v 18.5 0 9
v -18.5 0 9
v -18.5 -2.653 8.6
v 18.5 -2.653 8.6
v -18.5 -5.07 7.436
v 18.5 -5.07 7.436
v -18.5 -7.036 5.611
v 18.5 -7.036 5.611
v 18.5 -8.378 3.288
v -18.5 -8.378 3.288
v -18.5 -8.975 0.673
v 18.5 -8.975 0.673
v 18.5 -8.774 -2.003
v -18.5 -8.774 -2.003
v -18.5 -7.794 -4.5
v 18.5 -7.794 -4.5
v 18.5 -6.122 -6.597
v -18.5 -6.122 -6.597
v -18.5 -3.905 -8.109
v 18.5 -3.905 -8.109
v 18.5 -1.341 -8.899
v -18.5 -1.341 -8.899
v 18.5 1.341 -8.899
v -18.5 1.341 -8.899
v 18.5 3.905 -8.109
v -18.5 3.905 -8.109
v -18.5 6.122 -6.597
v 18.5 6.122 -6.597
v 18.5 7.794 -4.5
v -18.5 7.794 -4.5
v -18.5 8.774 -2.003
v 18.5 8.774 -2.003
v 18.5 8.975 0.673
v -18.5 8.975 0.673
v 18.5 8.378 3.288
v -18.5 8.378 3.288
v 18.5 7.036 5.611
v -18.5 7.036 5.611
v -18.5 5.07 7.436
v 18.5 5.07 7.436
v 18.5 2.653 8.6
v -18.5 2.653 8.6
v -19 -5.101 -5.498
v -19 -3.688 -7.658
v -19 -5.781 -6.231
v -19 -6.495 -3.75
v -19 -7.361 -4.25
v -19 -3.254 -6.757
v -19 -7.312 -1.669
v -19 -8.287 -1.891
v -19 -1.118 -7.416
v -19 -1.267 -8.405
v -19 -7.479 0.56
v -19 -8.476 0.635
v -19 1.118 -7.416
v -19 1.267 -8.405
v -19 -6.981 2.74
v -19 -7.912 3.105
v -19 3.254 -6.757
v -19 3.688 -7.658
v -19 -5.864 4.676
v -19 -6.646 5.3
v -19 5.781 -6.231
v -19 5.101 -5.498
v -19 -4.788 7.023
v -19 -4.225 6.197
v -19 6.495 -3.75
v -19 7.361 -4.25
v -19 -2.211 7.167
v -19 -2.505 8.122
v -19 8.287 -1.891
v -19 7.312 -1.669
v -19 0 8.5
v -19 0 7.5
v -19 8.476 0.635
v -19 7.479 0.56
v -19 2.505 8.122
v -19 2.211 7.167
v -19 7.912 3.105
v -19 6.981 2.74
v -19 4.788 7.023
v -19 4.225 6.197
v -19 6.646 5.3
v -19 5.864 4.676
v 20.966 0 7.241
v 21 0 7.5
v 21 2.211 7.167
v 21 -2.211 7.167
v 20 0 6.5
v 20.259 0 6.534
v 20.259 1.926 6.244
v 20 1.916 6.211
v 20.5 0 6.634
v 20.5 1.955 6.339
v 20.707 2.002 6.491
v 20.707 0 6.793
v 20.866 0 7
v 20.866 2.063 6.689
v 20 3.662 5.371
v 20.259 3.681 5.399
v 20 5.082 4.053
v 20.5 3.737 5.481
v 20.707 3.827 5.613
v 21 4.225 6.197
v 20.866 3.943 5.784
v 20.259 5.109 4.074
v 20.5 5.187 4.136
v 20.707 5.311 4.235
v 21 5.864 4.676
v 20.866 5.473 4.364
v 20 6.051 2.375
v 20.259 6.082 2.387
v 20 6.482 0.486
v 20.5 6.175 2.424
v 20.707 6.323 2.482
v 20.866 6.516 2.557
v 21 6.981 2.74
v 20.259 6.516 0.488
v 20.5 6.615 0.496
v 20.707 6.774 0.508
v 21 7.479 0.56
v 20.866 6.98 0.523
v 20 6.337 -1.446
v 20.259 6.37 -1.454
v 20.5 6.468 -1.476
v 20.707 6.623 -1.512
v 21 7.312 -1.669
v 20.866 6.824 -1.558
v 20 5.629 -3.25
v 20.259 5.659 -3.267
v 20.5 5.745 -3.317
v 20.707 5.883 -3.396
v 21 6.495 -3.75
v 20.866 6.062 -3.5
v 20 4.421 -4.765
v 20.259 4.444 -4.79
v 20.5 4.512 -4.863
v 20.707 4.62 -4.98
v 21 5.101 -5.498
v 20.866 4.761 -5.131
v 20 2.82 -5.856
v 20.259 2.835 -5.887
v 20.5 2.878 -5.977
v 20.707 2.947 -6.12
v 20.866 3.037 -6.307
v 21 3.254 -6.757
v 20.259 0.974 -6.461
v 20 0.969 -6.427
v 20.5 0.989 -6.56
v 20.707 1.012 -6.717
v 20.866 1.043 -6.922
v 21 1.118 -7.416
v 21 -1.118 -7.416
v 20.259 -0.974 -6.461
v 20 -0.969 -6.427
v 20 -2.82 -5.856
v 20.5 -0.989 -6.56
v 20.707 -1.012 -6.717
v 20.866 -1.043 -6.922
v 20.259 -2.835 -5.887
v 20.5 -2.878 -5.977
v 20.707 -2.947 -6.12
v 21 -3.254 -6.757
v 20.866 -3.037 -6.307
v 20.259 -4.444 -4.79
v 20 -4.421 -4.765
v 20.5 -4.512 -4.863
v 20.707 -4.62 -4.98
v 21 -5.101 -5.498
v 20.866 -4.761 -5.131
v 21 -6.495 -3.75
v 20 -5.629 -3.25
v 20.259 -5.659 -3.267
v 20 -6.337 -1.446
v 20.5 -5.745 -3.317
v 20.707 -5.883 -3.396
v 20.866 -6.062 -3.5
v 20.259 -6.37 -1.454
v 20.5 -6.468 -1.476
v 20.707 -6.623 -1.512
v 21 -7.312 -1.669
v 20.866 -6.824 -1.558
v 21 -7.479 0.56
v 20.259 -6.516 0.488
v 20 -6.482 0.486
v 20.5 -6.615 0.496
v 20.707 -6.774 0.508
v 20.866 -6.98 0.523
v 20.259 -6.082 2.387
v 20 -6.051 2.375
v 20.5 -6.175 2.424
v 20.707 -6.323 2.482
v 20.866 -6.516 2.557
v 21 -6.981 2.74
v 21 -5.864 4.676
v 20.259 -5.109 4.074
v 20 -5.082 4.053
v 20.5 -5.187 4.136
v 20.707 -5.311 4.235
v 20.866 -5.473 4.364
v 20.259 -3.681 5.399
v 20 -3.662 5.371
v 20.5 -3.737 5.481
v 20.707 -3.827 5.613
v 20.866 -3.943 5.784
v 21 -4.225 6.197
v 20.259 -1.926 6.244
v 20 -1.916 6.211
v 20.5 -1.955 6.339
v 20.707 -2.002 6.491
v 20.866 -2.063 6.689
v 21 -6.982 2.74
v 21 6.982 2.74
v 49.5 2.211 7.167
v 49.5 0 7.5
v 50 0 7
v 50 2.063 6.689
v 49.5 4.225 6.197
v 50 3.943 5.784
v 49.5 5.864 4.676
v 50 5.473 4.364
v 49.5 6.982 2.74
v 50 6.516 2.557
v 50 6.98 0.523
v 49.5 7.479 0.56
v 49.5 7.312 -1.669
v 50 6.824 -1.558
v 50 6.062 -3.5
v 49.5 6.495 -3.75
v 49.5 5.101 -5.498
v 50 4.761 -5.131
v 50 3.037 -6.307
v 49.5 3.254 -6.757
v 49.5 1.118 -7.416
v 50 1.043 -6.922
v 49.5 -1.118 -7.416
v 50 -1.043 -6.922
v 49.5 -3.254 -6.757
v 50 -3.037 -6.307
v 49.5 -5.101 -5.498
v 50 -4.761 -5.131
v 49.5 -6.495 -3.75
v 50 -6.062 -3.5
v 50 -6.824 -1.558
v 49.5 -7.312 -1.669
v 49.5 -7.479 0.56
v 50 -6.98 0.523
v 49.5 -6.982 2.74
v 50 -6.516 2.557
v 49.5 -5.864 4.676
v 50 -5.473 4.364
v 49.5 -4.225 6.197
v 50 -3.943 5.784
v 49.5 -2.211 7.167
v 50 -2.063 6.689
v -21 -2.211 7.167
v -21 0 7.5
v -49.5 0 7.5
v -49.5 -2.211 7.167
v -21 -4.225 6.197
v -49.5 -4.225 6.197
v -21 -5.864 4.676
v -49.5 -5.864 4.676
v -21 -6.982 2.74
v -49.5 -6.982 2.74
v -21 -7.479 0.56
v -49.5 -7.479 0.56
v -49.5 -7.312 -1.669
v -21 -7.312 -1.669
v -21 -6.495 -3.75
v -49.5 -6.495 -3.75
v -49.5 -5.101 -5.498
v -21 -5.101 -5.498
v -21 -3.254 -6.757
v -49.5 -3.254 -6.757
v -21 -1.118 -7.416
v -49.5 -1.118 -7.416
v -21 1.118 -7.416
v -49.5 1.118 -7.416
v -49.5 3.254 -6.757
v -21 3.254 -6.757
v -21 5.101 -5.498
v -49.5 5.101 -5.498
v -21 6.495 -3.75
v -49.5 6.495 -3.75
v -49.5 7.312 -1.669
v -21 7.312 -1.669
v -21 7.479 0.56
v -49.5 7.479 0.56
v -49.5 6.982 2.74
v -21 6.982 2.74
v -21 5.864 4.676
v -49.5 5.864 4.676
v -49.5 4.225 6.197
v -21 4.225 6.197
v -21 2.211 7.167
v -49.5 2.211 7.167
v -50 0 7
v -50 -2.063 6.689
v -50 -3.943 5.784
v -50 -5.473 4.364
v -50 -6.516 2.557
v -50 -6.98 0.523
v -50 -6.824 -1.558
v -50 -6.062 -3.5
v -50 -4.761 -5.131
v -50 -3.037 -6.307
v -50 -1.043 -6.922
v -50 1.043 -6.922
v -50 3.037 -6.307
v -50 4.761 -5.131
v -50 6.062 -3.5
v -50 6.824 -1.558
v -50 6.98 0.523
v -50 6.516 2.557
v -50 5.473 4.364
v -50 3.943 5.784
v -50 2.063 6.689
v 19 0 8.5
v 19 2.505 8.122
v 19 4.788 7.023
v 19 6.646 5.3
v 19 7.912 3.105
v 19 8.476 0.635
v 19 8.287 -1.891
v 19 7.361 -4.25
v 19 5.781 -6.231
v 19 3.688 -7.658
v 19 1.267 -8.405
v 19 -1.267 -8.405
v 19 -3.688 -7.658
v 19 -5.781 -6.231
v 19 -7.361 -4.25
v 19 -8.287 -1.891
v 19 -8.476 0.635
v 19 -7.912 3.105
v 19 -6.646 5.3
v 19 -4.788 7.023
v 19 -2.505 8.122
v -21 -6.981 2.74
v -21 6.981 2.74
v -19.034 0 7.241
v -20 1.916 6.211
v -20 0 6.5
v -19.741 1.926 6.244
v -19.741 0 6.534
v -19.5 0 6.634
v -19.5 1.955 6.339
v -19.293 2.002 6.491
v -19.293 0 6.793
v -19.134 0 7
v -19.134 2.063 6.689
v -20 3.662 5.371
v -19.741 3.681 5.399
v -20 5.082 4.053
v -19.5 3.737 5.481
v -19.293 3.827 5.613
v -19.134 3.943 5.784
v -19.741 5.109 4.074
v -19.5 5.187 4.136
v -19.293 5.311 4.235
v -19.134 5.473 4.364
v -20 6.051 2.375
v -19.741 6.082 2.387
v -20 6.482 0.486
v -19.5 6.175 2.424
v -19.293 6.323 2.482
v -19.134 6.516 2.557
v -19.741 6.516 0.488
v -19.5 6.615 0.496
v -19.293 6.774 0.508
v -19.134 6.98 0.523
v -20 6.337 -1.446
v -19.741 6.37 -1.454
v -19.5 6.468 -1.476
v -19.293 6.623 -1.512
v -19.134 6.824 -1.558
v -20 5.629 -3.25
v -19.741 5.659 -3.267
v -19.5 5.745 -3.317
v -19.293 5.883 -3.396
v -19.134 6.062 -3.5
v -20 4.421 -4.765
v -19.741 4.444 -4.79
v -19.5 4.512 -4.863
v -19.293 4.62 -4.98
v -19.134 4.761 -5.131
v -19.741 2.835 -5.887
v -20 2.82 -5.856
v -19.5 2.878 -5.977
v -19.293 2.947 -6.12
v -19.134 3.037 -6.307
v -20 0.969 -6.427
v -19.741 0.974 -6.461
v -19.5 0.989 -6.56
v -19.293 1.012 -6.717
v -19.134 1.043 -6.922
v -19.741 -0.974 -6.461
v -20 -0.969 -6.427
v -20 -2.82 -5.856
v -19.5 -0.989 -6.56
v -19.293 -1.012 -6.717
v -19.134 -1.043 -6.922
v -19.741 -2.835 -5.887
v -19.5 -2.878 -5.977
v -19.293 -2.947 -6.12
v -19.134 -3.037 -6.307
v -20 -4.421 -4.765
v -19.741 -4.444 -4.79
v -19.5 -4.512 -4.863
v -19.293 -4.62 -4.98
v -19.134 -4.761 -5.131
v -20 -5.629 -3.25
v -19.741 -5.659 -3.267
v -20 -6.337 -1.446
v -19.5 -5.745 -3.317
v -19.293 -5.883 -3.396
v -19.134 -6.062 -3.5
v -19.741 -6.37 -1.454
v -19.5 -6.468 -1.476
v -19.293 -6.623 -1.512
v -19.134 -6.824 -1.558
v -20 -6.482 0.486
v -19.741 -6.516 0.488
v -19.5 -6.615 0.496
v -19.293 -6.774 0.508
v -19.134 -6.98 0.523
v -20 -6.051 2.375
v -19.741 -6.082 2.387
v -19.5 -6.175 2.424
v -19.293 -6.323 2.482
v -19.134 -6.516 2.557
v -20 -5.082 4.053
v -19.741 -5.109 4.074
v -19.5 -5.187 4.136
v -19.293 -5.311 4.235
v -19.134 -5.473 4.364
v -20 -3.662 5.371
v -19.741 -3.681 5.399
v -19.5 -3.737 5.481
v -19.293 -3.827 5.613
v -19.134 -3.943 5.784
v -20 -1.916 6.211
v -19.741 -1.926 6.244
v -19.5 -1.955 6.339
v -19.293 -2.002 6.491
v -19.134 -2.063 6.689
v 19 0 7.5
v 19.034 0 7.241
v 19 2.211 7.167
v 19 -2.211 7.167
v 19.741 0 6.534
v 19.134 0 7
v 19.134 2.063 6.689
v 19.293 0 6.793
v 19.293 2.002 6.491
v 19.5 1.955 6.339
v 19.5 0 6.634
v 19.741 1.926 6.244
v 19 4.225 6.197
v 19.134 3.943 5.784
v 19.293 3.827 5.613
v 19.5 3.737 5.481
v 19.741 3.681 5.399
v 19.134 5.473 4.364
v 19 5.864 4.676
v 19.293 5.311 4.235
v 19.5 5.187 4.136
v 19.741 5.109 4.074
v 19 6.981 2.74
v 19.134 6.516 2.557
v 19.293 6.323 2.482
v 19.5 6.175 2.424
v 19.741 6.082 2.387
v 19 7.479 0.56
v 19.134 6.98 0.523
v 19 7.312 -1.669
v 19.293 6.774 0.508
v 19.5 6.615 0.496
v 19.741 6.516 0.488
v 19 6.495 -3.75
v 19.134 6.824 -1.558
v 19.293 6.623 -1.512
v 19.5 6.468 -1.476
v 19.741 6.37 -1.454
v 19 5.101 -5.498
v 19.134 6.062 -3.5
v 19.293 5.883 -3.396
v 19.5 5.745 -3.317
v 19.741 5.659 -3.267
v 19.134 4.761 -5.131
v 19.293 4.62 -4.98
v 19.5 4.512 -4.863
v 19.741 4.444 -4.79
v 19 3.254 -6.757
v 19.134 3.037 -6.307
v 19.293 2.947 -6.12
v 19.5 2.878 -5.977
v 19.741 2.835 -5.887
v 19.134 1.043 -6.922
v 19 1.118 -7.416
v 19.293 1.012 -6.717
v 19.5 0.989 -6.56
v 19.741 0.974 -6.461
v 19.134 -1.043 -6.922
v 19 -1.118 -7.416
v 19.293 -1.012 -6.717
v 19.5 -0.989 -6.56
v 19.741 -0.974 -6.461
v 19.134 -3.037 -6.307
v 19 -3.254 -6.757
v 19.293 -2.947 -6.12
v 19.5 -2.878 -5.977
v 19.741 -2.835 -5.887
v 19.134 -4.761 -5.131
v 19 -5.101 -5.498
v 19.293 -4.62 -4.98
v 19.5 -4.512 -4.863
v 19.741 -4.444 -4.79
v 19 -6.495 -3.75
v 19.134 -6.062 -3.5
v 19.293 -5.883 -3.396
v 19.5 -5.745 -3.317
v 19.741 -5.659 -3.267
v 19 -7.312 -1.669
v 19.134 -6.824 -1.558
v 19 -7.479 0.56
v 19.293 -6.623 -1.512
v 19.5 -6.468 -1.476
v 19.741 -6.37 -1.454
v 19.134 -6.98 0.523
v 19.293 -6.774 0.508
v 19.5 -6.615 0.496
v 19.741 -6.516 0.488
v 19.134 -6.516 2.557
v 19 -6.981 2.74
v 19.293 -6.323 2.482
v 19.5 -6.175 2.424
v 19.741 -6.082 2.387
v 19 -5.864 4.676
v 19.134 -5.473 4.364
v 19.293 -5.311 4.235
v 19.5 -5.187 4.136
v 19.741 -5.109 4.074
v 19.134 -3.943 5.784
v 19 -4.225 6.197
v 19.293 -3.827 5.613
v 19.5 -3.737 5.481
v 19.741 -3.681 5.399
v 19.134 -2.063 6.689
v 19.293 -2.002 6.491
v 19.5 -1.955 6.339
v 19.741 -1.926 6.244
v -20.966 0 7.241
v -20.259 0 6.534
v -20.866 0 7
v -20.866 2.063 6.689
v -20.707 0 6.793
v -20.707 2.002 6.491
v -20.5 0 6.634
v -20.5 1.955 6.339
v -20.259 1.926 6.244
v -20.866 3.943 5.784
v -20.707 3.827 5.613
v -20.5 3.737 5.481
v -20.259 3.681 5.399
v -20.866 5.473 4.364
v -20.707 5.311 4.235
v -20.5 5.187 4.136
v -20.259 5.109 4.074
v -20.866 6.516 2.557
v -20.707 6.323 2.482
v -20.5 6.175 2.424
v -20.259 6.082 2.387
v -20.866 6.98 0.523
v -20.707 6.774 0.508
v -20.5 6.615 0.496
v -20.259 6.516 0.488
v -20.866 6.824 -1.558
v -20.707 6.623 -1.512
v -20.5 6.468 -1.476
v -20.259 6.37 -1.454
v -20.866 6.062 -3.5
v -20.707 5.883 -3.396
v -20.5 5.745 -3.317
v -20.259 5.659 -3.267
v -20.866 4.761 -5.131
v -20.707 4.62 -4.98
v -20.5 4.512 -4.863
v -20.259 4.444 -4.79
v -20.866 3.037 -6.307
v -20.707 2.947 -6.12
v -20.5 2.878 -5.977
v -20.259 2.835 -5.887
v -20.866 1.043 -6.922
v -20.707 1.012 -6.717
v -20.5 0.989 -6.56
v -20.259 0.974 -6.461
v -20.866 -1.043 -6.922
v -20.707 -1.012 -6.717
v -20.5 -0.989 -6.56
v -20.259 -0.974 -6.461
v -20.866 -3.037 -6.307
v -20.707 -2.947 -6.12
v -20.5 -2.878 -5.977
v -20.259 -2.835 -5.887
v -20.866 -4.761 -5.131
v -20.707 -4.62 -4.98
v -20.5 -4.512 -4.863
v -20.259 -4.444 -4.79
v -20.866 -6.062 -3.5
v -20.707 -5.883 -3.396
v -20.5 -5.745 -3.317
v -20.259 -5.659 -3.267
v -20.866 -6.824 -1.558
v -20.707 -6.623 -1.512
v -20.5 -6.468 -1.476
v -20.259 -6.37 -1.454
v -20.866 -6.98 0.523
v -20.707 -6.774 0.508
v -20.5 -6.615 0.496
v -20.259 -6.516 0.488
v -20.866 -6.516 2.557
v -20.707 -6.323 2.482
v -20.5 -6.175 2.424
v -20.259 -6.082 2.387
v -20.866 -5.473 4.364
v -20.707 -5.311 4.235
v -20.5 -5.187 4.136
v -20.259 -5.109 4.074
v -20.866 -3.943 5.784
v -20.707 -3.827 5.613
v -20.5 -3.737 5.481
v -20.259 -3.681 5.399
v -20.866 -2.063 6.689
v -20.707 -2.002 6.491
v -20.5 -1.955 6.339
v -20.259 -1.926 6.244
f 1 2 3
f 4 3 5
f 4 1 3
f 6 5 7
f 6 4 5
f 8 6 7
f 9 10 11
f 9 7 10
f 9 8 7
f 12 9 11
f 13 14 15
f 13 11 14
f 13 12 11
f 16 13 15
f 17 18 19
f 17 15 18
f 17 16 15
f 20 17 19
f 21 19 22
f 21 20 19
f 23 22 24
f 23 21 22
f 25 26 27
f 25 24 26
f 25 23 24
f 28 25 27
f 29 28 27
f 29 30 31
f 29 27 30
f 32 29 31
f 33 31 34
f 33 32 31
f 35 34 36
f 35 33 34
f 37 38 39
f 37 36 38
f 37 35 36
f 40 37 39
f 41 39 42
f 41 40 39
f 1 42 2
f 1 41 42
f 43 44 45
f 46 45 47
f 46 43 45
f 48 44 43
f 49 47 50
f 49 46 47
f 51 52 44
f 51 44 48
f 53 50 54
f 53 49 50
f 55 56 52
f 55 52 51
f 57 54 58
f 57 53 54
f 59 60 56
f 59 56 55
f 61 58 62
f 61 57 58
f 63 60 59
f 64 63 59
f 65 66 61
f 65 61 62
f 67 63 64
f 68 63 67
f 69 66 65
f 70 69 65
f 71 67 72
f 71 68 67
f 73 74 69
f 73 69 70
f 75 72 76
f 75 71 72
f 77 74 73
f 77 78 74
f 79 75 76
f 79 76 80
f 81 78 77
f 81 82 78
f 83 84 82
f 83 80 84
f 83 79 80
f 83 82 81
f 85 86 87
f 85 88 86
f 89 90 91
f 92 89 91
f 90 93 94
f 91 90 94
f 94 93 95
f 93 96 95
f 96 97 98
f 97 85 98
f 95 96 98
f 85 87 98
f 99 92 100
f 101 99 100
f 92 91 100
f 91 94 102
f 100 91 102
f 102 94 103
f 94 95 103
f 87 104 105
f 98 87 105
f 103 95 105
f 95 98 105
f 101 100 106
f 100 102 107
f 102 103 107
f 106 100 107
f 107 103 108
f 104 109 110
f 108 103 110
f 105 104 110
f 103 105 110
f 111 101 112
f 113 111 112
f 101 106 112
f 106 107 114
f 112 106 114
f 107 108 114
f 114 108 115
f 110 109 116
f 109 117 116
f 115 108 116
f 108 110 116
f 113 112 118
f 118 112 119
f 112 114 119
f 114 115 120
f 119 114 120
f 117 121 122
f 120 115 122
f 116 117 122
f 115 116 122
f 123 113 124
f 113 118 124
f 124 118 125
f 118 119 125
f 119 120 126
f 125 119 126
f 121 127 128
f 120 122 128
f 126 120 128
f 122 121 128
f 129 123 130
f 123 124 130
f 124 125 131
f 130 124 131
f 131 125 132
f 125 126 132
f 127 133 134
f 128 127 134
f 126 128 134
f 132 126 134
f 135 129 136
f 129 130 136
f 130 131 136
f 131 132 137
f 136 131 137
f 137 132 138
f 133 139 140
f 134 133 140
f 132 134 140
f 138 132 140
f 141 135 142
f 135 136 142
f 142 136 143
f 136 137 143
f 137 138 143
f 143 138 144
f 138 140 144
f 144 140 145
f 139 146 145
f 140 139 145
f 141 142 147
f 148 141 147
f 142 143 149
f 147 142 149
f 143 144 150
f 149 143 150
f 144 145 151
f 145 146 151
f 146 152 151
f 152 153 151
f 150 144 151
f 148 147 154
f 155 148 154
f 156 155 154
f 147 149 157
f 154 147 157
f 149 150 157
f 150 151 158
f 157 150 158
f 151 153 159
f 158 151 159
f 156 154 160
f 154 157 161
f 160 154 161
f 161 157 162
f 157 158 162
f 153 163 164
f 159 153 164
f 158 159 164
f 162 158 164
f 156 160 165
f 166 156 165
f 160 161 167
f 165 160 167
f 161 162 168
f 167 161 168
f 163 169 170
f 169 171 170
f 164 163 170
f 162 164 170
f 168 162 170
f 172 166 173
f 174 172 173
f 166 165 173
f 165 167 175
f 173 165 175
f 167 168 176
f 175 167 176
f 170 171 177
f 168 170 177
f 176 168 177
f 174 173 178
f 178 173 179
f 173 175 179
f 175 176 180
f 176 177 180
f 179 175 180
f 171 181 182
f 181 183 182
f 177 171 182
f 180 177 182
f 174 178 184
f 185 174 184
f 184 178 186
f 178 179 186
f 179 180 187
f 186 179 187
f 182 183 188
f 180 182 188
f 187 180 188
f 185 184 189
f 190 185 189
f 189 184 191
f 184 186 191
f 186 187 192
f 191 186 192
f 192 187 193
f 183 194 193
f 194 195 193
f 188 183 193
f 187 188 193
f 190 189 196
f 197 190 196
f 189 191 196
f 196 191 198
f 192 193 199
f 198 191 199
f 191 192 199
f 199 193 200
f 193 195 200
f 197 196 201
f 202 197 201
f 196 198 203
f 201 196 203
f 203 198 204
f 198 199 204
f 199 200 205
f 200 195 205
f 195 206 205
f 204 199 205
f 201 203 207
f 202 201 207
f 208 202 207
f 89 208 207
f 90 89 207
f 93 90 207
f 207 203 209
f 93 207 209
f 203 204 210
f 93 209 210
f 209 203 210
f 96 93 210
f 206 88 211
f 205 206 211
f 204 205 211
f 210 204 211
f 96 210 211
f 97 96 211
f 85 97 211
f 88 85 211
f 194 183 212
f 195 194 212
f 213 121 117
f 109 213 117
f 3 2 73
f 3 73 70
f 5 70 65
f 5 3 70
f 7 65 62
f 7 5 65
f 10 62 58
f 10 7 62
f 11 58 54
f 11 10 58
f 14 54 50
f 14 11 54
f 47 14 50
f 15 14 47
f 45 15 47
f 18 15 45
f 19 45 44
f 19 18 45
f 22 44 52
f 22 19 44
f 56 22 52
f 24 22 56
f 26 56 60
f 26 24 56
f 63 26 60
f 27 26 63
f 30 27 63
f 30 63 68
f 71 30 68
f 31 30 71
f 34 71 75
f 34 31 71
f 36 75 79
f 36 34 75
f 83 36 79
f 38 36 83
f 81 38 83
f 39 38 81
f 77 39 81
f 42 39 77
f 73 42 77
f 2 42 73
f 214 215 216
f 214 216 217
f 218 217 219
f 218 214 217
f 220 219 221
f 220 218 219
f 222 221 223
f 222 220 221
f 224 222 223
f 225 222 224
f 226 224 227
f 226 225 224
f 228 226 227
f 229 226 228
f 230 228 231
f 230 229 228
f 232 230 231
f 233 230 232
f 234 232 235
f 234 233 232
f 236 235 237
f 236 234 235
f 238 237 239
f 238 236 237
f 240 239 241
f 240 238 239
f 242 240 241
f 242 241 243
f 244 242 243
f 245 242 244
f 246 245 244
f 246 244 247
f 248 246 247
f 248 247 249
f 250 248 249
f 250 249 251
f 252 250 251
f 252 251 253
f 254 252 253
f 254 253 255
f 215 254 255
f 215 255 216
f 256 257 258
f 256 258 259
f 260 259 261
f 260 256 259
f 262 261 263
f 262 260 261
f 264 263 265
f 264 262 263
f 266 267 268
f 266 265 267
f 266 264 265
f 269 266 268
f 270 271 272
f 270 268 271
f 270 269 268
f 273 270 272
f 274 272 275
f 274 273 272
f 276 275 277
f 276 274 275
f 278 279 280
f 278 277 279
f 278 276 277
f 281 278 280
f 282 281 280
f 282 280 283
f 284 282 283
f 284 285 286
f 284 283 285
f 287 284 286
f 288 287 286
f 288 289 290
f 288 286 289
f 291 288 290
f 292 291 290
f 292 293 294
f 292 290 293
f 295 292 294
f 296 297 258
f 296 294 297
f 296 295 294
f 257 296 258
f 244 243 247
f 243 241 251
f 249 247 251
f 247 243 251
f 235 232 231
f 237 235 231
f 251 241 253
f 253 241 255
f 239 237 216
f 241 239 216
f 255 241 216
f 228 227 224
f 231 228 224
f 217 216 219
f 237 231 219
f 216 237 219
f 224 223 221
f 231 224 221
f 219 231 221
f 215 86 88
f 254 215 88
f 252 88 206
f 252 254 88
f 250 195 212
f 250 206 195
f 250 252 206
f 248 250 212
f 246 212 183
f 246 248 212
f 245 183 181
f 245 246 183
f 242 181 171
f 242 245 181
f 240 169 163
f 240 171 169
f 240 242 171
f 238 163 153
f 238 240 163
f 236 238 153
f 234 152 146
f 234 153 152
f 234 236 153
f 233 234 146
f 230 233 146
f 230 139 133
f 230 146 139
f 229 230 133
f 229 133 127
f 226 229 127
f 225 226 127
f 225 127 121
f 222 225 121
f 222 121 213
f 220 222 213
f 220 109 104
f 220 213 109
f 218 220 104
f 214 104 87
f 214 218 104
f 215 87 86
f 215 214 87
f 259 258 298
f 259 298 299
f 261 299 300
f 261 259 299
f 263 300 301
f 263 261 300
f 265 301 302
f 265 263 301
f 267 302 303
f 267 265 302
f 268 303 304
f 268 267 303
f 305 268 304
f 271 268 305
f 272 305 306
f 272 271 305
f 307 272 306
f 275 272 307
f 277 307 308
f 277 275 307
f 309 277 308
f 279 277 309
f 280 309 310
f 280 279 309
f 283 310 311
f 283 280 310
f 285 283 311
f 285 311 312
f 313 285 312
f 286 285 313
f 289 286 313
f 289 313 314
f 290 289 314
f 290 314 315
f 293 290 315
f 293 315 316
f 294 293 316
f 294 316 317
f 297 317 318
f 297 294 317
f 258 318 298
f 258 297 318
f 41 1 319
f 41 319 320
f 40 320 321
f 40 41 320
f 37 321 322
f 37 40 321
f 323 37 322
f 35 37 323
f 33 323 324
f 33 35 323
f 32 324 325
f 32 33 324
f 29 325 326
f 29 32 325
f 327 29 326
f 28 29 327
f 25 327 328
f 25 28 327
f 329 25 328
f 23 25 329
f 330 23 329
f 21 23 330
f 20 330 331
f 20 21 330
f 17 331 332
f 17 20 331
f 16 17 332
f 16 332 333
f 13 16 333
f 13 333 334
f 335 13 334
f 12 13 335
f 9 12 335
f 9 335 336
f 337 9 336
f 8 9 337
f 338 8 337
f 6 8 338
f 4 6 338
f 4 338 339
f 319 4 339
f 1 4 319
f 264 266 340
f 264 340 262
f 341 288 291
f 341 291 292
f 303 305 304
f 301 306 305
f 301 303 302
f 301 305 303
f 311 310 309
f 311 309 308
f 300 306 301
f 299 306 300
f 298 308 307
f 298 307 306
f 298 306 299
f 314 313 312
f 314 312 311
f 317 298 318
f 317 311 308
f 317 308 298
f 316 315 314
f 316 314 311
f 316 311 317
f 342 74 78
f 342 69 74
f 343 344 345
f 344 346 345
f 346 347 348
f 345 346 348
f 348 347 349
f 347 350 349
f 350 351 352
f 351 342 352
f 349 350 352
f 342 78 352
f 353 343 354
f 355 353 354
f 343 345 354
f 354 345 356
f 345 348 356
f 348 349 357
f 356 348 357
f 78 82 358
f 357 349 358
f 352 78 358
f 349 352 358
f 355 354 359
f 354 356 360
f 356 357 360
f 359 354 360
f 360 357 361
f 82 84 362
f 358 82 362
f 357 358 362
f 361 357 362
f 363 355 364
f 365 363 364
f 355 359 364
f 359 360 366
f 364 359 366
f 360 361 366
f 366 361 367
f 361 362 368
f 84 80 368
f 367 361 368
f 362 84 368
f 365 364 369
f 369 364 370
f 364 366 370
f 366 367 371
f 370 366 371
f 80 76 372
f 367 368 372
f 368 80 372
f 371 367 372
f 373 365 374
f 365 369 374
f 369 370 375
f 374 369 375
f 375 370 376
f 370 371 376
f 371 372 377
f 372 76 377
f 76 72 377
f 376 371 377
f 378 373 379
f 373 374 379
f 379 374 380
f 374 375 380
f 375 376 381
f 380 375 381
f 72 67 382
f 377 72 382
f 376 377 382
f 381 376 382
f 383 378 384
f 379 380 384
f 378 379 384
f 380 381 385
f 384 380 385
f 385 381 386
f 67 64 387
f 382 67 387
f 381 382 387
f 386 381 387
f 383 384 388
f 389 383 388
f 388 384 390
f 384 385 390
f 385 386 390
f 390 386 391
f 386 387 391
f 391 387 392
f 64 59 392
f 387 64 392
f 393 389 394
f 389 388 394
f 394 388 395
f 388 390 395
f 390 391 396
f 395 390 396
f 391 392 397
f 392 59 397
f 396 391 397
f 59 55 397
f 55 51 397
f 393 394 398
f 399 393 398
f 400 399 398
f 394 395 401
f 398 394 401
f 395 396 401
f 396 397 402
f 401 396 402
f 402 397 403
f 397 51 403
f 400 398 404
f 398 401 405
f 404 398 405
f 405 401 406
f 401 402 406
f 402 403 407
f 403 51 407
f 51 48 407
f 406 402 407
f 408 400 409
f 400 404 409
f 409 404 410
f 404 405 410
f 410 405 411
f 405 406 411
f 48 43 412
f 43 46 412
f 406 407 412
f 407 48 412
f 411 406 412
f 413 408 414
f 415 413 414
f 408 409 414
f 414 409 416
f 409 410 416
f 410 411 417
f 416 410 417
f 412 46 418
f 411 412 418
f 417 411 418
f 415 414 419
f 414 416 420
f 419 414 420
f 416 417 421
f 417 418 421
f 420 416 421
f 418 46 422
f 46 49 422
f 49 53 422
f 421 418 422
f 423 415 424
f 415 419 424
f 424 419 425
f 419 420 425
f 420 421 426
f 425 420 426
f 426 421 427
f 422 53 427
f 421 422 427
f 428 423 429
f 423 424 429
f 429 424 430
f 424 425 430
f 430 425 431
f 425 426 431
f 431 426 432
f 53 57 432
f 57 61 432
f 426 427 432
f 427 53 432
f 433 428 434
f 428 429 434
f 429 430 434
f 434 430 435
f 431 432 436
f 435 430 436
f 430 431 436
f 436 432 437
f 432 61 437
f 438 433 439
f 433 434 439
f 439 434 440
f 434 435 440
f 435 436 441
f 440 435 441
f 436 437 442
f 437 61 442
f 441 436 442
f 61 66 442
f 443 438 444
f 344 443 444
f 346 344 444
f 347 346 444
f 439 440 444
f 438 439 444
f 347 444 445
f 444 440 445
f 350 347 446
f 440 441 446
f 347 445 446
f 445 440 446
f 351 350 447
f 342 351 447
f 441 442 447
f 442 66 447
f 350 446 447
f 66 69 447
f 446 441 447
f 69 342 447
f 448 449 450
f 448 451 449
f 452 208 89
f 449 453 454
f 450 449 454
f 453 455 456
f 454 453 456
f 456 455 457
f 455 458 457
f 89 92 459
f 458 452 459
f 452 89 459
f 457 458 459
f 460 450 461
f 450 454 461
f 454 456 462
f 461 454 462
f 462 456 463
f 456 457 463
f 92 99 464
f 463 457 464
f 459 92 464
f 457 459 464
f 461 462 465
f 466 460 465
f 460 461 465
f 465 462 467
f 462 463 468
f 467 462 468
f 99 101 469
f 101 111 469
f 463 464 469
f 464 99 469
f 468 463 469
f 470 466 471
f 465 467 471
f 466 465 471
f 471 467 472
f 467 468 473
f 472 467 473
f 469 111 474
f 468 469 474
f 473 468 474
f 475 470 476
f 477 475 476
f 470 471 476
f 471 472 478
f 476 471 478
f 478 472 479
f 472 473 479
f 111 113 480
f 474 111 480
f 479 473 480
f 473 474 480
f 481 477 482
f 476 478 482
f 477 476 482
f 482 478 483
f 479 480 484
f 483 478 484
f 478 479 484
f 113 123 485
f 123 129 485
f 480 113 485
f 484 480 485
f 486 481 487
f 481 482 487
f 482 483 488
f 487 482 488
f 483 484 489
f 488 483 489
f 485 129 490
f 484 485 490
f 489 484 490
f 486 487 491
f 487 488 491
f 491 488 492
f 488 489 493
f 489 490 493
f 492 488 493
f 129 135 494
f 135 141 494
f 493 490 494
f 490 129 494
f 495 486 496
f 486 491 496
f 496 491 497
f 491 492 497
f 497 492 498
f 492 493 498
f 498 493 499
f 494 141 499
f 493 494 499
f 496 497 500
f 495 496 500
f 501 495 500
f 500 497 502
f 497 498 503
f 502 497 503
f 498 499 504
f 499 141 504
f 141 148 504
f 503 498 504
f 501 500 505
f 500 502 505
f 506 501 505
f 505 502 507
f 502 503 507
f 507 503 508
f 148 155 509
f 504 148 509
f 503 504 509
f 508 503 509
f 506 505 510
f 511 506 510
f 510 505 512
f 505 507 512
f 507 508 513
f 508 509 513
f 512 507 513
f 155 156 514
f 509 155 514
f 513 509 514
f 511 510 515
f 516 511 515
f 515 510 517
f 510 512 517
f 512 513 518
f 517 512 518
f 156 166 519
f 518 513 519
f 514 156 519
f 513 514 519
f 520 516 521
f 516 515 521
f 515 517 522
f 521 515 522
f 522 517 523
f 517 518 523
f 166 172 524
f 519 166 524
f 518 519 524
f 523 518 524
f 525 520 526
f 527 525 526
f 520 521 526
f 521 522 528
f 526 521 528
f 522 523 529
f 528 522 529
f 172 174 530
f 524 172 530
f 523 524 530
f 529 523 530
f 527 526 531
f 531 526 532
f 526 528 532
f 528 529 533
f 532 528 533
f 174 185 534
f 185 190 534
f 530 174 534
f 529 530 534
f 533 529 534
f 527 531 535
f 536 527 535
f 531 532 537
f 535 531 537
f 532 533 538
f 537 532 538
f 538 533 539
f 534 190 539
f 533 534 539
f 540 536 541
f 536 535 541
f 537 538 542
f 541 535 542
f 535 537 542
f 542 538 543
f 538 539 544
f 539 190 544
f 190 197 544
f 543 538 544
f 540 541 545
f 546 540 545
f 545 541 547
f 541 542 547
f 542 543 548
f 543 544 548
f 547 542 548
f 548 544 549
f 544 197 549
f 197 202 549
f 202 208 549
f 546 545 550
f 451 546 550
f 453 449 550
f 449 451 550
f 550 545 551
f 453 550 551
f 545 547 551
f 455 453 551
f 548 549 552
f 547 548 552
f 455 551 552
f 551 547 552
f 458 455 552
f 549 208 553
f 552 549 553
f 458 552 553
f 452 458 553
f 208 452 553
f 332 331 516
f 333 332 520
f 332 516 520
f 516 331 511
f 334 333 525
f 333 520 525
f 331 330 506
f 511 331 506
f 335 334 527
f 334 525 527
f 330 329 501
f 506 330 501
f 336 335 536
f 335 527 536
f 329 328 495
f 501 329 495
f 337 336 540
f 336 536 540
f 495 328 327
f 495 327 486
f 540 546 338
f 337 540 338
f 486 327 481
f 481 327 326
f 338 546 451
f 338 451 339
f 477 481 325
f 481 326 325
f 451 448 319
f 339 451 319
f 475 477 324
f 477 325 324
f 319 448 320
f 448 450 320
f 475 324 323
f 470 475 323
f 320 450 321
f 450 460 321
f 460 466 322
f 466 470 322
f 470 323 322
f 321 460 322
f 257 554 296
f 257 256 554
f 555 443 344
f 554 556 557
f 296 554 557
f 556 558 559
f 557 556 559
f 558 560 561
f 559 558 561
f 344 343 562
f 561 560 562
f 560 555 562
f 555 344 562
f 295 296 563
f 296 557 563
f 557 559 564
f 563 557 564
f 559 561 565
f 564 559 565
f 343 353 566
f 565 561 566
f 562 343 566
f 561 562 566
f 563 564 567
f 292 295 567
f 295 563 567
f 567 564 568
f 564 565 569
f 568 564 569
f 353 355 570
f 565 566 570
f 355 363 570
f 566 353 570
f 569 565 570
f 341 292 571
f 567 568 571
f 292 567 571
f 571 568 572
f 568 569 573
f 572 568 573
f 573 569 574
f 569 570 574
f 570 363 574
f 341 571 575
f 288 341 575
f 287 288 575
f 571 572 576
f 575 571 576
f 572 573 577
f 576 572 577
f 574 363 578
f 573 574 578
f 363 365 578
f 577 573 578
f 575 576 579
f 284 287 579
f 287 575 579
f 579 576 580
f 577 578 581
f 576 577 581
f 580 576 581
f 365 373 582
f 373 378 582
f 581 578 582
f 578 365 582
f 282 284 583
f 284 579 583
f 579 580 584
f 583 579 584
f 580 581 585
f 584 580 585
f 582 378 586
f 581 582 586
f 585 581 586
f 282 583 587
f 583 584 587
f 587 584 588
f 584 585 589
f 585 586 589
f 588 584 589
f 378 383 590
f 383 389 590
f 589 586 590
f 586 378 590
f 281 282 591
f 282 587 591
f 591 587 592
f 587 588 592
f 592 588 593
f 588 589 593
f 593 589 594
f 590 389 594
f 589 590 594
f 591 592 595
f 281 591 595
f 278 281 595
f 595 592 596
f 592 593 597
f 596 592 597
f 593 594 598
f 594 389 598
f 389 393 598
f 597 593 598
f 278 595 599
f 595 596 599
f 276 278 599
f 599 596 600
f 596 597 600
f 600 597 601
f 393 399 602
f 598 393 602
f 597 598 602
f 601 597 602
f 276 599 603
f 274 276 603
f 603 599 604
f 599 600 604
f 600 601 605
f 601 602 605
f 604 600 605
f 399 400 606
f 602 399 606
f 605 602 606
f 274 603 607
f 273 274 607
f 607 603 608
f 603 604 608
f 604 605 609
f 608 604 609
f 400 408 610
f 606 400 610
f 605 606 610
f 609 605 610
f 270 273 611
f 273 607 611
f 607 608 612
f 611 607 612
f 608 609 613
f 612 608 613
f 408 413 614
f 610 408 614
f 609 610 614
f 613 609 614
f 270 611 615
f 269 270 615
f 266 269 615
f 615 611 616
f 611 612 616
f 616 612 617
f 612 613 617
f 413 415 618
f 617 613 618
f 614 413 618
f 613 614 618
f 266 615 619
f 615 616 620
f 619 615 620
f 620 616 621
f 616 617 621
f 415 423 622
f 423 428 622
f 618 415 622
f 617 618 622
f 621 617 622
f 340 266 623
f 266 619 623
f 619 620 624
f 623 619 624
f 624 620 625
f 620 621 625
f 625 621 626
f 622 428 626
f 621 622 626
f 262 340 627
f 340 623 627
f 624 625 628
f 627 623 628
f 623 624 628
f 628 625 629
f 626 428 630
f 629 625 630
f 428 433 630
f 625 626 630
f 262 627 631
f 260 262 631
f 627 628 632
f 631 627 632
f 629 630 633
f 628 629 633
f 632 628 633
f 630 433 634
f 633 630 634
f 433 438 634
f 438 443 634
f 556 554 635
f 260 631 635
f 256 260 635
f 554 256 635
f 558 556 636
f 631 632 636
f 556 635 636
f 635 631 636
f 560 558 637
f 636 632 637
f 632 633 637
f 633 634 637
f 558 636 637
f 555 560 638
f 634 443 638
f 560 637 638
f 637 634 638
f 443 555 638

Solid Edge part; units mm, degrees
sketch "Sketch1" plane through (0, 0, 0) normal (0, -1, 0) x (1, 0, 0)
  line L0 (-50, 0) -> (-50, 7.5)
  line L1 (-50, 7.5) -> (-21, 7.5)
  line L2 (-21, 7.5) -> (-21, 6.5)
  line L3 (-21, 6.5) -> (-19, 6.5)
  line L4 (-19, 6.5) -> (-19, 9)
  line L5 (-19, 9) -> (19, 9)
  line L6 (19, 9) -> (19, 6.5)
  line L7 (19, 6.5) -> (21, 6.5)
  line L8 (21, 6.5) -> (21, 7.5)
  line L9 (21, 7.5) -> (50, 7.5)
  line L10 (50, 7.5) -> (50, 0)
  dimension "D1" = 100
  dimension "D2" = 38
  dimension "D3" = 2
revolve "RevolvedProtrusion1" add sketch "Sketch1" angle 360 about axis through (50, 0, 0) along (-1, 0, 0)
chamfer "Chamfer1" distance 0.5 angle 45 4 edges at (-50, 0, -7.5) (50, 0, -7.5) (-19, 0, -9) (19, 0, -9)
fillet "Round_1" radius 1 4 edges at (-21, 0, -6.5) (-19, 0, -6.5) (19, 0, -6.5) (21, 0, -6.5)
properties material "AlSi7Mg"
